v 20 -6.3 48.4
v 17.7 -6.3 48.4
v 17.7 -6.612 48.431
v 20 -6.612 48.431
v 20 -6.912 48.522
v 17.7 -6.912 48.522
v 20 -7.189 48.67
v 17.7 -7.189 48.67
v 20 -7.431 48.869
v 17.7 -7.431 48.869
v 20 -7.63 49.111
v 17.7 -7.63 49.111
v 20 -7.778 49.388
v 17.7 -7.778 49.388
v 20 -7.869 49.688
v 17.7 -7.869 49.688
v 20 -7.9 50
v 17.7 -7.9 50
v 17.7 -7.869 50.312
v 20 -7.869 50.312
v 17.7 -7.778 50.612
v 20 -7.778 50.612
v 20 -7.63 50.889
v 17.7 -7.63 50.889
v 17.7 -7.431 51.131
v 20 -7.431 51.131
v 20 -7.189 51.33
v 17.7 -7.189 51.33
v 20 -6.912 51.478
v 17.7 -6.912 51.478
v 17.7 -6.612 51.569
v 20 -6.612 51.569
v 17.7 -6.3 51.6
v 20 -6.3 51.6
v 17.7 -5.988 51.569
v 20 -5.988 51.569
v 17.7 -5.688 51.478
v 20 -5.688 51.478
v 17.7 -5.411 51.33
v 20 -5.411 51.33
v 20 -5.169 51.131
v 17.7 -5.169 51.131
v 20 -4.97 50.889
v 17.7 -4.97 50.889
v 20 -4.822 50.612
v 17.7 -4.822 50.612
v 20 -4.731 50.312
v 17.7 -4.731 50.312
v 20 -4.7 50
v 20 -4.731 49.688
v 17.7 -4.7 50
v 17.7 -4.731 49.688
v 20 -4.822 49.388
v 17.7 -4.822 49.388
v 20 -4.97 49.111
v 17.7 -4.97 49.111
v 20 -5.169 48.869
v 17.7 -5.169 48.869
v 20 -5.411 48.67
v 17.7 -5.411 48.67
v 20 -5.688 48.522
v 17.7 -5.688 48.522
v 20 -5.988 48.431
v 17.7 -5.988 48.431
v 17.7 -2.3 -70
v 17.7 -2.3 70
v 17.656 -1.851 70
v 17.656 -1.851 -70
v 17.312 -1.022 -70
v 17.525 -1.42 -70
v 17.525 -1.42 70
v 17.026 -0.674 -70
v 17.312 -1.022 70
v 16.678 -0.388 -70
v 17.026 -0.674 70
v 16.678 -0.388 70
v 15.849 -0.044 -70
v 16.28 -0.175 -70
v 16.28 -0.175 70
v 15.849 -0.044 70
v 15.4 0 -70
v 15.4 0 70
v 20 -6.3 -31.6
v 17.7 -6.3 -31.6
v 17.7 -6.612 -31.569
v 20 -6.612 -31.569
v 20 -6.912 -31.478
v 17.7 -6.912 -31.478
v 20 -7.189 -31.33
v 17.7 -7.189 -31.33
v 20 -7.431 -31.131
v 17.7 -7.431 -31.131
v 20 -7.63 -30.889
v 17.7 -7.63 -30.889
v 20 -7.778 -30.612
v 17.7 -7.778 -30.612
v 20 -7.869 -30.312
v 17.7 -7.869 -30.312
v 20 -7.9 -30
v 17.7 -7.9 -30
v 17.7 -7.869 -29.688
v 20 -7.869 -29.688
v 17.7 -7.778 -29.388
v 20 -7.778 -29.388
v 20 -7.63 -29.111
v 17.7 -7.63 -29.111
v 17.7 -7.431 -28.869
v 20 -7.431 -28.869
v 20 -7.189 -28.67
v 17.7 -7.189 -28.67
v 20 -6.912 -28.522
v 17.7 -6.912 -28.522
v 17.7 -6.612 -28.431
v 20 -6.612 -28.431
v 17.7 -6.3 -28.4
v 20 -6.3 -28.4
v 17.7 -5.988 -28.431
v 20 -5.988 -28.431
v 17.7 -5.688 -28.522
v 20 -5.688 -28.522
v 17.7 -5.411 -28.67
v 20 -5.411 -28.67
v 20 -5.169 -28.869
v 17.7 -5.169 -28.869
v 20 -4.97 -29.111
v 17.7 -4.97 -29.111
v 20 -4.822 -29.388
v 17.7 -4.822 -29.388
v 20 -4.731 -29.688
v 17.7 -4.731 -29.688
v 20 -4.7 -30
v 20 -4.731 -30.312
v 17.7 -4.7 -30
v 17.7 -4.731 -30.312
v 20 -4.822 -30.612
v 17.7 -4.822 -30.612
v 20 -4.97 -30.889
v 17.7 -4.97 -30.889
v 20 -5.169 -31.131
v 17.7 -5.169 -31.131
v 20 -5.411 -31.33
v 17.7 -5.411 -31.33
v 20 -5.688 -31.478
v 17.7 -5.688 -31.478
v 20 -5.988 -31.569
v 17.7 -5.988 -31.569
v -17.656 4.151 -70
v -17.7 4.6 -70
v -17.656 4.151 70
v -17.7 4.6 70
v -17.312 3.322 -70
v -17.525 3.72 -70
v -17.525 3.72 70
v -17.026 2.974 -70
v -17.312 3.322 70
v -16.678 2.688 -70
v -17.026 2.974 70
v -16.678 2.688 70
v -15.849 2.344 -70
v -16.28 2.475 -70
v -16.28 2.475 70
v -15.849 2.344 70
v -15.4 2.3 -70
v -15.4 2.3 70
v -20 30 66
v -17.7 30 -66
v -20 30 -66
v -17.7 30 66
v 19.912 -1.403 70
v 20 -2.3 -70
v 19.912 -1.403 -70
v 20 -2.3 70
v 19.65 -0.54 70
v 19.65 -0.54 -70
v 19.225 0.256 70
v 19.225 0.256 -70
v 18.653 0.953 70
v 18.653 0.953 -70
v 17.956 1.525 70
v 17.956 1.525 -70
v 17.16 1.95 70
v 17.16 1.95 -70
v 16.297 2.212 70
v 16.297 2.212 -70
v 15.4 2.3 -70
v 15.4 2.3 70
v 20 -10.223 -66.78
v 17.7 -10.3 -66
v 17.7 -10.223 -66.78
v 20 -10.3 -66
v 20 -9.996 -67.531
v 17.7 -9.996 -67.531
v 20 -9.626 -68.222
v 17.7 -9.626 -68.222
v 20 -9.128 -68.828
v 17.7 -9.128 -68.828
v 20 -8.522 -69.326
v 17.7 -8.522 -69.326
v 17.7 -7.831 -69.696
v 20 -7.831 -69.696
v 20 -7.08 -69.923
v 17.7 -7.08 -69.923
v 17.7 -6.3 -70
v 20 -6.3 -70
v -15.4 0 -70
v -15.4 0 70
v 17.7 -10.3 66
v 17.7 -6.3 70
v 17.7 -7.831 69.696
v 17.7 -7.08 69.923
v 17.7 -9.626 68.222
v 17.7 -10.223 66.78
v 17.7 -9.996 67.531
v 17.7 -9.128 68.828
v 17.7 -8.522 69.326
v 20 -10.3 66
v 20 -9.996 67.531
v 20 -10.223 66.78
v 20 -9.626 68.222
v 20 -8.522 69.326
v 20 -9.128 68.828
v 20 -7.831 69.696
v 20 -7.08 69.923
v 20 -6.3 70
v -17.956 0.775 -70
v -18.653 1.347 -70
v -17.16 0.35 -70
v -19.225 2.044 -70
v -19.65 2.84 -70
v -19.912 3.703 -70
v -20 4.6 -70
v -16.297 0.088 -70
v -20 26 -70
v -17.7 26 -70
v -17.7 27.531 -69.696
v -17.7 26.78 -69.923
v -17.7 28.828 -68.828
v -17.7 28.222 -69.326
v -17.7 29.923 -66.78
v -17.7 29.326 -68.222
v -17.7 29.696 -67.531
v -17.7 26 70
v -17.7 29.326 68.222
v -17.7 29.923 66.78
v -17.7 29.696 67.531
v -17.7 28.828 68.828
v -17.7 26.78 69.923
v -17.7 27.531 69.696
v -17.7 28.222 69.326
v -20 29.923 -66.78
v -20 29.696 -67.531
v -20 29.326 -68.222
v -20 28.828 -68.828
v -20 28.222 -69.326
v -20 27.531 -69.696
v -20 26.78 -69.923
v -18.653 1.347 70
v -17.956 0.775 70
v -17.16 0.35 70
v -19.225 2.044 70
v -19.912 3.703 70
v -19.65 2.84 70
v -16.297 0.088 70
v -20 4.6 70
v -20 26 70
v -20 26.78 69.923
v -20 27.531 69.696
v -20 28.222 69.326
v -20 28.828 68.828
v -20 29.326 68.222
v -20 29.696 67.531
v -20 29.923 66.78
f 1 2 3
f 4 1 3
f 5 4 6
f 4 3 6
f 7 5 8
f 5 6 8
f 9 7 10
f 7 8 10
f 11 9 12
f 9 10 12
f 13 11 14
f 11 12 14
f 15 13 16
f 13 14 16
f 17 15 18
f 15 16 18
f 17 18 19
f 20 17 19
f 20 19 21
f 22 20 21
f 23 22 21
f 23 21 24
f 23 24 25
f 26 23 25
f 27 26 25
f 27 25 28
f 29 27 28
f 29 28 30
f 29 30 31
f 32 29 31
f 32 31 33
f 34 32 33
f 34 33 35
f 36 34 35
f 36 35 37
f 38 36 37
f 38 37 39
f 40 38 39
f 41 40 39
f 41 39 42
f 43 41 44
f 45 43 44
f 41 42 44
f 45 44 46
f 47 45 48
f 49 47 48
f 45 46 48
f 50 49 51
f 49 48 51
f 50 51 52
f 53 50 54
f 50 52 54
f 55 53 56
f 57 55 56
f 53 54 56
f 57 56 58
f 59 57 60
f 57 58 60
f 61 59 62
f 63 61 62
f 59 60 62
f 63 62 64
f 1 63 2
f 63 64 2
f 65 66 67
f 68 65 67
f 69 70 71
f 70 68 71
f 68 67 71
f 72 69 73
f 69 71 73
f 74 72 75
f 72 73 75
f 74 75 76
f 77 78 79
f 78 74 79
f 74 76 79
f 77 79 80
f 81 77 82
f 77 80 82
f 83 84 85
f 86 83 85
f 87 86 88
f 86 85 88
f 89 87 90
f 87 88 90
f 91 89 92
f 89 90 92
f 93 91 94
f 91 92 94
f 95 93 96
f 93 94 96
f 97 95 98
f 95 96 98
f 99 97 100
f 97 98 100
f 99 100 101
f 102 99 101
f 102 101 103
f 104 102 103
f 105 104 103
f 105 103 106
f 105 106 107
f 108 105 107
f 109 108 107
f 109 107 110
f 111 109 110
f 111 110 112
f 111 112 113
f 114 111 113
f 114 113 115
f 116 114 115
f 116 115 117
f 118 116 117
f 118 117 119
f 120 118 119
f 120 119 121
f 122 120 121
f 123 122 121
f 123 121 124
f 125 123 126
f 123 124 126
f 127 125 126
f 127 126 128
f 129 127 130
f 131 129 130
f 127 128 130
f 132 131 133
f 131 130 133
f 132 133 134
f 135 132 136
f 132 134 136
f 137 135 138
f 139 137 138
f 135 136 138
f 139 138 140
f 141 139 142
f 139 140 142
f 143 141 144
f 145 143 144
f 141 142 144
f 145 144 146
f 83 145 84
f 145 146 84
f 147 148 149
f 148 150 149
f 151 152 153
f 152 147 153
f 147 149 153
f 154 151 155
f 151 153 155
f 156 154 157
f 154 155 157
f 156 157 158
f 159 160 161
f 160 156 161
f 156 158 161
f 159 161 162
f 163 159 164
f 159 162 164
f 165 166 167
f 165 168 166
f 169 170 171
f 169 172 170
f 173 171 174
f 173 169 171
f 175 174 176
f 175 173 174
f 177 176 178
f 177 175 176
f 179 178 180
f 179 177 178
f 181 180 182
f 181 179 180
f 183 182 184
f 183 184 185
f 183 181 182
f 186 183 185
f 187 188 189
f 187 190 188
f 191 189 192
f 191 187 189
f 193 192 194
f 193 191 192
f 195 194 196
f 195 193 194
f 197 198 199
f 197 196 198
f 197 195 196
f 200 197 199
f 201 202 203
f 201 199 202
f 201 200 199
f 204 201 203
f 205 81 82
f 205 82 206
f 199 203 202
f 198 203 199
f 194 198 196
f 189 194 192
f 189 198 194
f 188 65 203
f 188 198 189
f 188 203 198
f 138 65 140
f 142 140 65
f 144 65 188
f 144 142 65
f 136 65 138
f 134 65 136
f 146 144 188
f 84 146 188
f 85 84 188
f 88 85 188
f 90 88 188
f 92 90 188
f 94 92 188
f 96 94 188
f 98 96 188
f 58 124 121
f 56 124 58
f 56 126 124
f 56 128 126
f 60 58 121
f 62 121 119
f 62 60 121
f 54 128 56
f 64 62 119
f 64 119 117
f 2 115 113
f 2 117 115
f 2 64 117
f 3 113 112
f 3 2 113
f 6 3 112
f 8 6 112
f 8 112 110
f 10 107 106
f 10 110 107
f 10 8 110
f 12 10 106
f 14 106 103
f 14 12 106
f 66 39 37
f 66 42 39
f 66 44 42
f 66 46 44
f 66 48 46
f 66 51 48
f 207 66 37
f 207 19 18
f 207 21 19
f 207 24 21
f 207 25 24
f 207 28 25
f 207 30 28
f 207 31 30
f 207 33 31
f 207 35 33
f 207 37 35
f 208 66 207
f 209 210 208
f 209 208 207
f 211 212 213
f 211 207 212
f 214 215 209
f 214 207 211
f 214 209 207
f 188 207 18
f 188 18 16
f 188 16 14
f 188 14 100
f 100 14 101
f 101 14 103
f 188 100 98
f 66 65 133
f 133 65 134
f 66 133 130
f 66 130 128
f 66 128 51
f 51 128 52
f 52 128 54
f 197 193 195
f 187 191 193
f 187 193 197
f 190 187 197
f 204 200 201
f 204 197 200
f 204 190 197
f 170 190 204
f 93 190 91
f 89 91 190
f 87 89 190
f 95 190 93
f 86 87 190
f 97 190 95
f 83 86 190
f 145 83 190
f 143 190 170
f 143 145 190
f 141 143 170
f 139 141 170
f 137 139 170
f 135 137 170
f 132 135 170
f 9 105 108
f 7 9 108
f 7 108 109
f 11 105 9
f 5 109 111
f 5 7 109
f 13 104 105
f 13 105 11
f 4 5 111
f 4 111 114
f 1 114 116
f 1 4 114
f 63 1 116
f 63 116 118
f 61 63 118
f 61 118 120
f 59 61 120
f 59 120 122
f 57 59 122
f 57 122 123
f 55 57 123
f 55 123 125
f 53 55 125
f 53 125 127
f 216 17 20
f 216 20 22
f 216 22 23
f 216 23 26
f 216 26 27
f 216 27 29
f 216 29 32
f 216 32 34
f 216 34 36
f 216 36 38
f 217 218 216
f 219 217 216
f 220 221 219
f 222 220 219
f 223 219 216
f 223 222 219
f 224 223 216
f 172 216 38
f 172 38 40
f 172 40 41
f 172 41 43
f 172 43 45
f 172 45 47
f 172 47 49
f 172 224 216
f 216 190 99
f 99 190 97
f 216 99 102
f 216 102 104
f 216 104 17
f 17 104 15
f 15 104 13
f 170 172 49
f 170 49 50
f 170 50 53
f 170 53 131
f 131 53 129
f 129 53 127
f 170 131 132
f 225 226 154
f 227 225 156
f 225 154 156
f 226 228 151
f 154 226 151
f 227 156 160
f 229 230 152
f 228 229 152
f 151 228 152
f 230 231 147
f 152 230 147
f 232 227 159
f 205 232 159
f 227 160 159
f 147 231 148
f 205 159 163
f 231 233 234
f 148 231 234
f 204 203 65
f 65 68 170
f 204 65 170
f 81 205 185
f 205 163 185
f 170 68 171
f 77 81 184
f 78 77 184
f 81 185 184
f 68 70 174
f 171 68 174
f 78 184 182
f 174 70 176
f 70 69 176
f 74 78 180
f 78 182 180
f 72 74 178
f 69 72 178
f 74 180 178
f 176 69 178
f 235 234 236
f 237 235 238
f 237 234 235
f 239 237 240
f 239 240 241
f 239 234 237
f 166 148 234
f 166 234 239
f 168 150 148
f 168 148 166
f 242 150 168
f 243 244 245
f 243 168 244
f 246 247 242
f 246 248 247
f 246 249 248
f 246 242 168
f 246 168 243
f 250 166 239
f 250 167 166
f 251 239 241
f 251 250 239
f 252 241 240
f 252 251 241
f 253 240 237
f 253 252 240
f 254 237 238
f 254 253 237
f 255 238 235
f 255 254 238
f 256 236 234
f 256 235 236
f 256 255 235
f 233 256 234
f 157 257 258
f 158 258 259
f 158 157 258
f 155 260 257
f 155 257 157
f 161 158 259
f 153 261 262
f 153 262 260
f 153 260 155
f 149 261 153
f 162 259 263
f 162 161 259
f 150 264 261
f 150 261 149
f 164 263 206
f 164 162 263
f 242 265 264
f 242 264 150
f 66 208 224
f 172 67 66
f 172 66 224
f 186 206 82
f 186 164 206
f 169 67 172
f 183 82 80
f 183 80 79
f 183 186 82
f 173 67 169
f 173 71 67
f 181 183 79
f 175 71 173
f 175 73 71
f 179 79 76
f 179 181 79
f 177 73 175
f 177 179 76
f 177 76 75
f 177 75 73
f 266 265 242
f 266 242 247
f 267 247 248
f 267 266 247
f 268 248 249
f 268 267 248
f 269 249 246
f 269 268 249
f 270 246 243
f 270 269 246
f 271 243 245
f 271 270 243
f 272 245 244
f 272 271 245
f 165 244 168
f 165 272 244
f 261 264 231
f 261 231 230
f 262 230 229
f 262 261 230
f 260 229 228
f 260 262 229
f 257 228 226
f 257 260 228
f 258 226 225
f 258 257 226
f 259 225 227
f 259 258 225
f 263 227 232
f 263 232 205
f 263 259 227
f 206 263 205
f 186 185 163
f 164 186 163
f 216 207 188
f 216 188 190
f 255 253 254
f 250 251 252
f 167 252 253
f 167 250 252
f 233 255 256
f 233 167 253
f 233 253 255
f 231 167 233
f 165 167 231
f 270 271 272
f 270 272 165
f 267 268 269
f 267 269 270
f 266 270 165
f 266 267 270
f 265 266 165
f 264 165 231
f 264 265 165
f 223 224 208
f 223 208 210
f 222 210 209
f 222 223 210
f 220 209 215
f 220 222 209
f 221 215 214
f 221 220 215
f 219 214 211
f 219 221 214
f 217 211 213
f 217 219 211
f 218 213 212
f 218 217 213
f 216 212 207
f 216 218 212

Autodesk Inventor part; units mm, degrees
ref_plane "YZ Plane" through (0, 0, 0) normal (1, 0, 0) x (0, 1, 0)
ref_plane "XZ Plane" through (0, 0, 0) normal (0, 1, 0) x (-1, 0, 0)
ref_plane "XY Plane" through (0, 0, 0) normal (0, 0, 1) x (1, 0, 0)
sketch "スケッチ1" plane through (0, 0, 0) normal (0, 1, 0) x (-1, 0, 0)
  line L0 (-20, 70) -> (20, 70)
  line L1 (20, 70) -> (20, -70)
  line L2 (20, -70) -> (-20, -70)
  line L3 (-20, -70) -> (-20, 70)
  line L4 (-20, 70) -> (20, -70) construction
  line L5 (20, 70) -> (-20, -70) construction
  point P0 (0, 0)
  dimension "d0" = 140
  dimension "d1" = 40
extrude "プレート1" add sketch "スケッチ1" along normal blind 2.3
sketch "スケッチ2" plane through (17.7, 2.3, 70) normal (1, 0, 0) x (0, 1, 0)
  line L0 (0, -140) -> (0, 0)
  line L1 (0, 0) -> (-12.6, 0)
  line L2 (-12.6, 0) -> (-12.6, -140)
  line L3 (-12.6, -140) -> (0, -140)
edge flange "フランジ1" height 12.6 angle 90 thickness 2.3 bend radius 2.3 thickness toward (1, 0, 0) relief tear relief width 2.3 relief depth 1.15 edges at (20, 0, 0) wall of the first edge with corners at (17.7, 2.3, -70) (17.7, 2.3, 70) (17.7, -10.3, 70) (17.7, -10.3, -70)
bend "曲げ1"
corner "コーナー1"
sketch "スケッチ3" plane through (-17.7, 0, 70) normal (-1, 0, 0) x (0, -1, 0)
  line L0 (0, -140) -> (0, 0)
  line L1 (0, 0) -> (-30, 0)
  line L2 (-30, 0) -> (-30, -140)
  line L3 (-30, -140) -> (0, -140)
edge flange "フランジ2" height 30 angle 90 thickness 2.3 bend radius 2.3 thickness toward (-1, 0, 0) relief tear relief width 2.3 relief depth 1.15 edges at (-20, 2.3, 0) wall of the first edge with corners at (-17.7, 0, -70) (-17.7, 0, 70) (-17.7, 30, 70) (-17.7, 30, -70)
bend "曲げ2"
corner "コーナー2"
sketch "スケッチ4" plane through (20, -10.3, 70) normal (1, 0, 0) x (0, 0, -1)
  line L0 (140, 0) -> (0, 0) projected
  line L1 (0, 0) -> (0, 8) projected
  point P0 (70, 10.3)
  point P1 (20, 4)
  point P2 (100, 4)
  dimension "d23" = 4
  dimension "d24" = 80
  dimension "d25" = 20
hole "穴1" at (20, -6.3, 50) at (20, -6.3, -30) direction (-1, 0, 0) diameter 3.2 depth 2.3 tip angle 118 clearance for "Flat Head Machine Screw" size "M3" standard "Ansi Metric M Profile"
fillet "コーナーR1" radius 4 4 edges at (18.85, -10.3, 70) (18.85, -10.3, -70) (-18.85, 30, -70) (-18.85, 30, 70)
equation "\"d31\" = Thickness"
equation "\"d2\" = Thickness"
equation "\"d3\" = BendReliefWidth"
equation "\"d4\" = BendReliefDepth"
equation "\"d5\" = MinimumRemnant"
equation "\"d6\" = TransitionRadius"
equation "\"d9\" = BendRadius"
equation "\"d10\" = CornerReliefSize"
equation "\"d11\" = GapSize"
equation "\"d12\" = JacobiRadiusSize"
equation "\"d13\" = BendReliefWidth"
equation "\"d14\" = BendReliefDepth"
equation "\"d15\" = MinimumRemnant"
equation "\"d16\" = TransitionRadius"
equation "\"d19\" = BendRadius"
equation "\"d20\" = CornerReliefSize"
equation "\"d21\" = GapSize"
equation "\"d22\" = JacobiRadiusSize"
equation "\"BendRadius\" = Thickness"
equation "\"BendReliefWidth\" = Thickness"
equation "\"BendReliefDepth\" = 0.5 * Thickness"
equation "\"CornerReliefSize\" = 4 * Thickness"
equation "\"MinimumRemnant\" = 2 * Thickness"
equation "\"TransitionRadius\" = BendRadius"
equation "\"JacobiRadiusSize\" = BendRadius"
equation "\"GapSize\" = Thickness"
equation "\"Thickness\" = 2.3"
properties part number "plate7" material "鋼、炭素鋼"
